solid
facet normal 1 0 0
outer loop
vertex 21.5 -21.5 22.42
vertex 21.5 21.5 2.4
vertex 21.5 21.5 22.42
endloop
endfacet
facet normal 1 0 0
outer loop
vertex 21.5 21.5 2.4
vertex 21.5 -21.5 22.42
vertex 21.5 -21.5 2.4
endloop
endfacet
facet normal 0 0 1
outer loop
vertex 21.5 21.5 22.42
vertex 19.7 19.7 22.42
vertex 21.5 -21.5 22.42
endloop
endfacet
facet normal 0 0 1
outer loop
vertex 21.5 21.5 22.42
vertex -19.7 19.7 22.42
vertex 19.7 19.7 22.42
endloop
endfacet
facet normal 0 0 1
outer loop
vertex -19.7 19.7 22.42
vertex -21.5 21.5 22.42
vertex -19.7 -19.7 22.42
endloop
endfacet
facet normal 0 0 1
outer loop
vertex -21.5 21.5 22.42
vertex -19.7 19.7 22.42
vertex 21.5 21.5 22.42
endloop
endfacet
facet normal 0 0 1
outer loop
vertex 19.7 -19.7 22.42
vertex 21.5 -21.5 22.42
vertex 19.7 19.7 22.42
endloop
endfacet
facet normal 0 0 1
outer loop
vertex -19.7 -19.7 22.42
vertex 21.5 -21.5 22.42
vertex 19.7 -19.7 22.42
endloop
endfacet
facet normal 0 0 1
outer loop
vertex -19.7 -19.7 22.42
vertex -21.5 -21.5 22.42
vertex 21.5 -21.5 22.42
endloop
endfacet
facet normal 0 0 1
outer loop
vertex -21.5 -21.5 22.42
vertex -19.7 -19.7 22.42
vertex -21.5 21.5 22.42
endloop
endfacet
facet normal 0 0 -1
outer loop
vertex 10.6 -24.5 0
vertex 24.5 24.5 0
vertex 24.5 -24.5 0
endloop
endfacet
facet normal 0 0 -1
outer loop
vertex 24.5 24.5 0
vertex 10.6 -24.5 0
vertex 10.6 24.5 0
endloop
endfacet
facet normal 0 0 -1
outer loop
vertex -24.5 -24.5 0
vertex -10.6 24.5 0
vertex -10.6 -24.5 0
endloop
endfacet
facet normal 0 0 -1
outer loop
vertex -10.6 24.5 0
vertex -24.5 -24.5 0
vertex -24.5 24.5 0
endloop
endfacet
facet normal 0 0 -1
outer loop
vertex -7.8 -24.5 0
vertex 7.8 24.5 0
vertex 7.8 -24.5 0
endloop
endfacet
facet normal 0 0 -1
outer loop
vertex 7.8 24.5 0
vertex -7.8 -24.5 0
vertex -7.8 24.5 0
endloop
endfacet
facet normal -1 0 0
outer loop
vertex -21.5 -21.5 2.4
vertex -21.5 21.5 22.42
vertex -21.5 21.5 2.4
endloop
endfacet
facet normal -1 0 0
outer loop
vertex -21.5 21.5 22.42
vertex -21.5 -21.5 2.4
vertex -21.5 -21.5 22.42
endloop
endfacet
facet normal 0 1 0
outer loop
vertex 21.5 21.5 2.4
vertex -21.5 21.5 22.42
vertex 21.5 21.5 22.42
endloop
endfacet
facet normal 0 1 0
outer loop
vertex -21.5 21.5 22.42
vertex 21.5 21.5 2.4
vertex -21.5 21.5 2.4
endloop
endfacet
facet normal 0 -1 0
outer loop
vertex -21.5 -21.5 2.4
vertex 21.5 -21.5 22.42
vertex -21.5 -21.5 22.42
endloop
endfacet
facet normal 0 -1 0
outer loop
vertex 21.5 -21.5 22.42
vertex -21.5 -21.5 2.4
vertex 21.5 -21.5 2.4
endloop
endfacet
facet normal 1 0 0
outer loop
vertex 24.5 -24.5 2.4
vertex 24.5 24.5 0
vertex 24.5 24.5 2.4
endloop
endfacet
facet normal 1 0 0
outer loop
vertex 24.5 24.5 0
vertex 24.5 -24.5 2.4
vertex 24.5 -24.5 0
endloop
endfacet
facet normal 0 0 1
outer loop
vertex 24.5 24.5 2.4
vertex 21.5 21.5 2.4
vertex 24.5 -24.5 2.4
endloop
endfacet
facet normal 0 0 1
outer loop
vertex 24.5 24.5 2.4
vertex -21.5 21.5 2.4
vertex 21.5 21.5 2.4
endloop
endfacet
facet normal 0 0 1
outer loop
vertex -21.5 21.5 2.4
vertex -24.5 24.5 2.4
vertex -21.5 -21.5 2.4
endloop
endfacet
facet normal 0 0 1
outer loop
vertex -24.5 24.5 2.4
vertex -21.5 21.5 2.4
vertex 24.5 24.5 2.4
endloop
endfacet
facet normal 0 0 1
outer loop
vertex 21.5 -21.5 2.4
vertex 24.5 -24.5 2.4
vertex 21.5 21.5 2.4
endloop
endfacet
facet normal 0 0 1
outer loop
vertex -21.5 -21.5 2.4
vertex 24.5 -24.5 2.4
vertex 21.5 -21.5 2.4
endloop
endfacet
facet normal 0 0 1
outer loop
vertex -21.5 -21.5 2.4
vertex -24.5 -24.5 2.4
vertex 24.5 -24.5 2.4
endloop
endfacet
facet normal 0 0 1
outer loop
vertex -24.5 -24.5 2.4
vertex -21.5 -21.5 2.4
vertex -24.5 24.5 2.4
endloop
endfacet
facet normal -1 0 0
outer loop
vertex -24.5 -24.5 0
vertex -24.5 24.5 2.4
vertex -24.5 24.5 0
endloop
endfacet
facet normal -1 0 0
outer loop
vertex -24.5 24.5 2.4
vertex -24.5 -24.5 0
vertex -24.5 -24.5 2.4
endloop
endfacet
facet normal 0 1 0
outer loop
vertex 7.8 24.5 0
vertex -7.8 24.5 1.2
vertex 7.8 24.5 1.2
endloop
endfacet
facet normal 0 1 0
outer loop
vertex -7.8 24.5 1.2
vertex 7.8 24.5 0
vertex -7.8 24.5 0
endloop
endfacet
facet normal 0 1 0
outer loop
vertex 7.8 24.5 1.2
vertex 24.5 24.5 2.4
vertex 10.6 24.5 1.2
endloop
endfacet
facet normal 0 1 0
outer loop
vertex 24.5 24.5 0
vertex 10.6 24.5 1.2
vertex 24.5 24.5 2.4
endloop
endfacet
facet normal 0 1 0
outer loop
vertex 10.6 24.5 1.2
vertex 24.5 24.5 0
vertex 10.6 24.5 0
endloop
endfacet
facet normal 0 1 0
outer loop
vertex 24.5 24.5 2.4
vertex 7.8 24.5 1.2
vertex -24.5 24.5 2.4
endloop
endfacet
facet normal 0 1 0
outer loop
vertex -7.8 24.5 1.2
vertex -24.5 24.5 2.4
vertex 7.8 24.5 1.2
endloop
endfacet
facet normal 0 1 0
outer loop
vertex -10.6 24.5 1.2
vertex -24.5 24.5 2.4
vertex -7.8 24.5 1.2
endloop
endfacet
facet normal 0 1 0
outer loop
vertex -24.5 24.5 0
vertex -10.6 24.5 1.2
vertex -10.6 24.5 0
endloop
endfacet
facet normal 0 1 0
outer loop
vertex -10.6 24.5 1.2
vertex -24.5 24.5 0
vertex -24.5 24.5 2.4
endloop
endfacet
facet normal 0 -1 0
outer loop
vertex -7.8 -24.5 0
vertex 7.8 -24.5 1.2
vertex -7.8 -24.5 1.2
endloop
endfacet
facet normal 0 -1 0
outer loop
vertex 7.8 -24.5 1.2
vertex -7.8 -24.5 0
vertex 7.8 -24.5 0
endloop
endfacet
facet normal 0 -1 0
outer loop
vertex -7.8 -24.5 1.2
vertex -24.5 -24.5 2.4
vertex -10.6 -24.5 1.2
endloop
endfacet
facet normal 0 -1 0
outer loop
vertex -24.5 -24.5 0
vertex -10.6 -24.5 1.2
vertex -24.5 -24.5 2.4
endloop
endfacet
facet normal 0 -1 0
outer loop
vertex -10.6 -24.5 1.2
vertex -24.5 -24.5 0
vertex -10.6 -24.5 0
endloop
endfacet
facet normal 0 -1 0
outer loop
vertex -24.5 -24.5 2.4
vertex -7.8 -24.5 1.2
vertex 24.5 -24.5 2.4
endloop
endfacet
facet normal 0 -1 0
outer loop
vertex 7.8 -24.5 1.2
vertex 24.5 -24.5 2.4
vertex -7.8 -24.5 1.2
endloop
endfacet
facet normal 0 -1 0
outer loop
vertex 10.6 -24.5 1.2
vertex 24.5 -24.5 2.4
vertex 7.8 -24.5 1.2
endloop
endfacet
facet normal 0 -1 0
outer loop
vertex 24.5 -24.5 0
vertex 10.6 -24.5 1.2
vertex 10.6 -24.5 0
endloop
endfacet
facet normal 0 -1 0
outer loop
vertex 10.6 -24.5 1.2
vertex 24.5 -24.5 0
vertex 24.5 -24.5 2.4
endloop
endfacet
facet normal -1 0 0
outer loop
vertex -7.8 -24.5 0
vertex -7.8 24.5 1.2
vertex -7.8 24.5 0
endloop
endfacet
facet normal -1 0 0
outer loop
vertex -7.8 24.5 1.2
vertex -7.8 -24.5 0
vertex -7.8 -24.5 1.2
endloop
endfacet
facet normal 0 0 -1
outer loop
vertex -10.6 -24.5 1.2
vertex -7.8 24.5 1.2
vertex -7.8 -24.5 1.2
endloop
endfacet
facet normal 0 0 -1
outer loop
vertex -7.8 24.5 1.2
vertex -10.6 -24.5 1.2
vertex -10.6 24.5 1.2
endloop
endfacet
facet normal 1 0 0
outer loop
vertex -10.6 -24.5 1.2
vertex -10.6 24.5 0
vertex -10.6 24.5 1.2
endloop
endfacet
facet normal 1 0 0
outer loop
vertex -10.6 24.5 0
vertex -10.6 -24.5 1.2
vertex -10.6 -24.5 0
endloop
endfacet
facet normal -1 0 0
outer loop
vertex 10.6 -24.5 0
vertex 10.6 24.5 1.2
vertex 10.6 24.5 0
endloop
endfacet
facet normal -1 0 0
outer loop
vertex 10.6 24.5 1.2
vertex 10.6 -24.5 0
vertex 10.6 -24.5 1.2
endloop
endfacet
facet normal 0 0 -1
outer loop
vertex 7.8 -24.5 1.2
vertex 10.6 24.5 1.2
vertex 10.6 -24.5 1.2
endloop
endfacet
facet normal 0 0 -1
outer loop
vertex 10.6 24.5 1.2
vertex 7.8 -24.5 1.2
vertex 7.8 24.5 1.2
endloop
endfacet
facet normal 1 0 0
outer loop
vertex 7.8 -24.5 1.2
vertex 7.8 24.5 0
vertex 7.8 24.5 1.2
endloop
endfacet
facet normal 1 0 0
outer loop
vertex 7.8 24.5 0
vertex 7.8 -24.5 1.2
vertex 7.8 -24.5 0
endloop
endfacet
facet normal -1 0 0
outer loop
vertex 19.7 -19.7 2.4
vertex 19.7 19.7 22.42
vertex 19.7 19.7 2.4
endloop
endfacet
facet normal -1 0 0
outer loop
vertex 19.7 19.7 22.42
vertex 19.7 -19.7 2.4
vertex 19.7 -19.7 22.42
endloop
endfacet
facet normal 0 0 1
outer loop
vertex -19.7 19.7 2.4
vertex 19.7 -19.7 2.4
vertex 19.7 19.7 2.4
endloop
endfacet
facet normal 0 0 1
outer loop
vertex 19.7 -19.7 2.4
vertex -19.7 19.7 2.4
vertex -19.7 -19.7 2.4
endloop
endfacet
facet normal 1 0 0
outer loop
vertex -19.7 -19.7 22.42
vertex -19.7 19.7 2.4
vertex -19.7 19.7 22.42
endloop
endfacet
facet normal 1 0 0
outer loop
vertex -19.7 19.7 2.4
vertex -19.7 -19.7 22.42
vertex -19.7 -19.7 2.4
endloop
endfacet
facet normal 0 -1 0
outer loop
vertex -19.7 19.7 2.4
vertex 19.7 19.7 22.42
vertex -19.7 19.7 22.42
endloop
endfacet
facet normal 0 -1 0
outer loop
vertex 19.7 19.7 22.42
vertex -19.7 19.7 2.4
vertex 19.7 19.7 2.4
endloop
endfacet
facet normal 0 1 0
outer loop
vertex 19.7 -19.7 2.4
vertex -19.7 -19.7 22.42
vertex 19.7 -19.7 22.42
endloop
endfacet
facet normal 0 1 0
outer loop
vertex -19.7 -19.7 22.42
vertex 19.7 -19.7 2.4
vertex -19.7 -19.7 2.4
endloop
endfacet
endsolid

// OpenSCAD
// -*- mode: SCAD ; c-file-style: "ellemtel" ; coding: utf-8 -*-
//
// A simple "coaster" to stop condiment bottles from falling over when
// placed on the bars of a the grid in the fridge
//
// Copyright 2018 Roland Sieker <ospalh@gmail.com>
// Licence: CC-BY-SA 4.0


// Distance from one bar of the fridge shelf grid to the next. All sizes are in millimetres.
bar_spacing = 18.4;  // [5:0.1:30]
// Diameter of one shelf grid bar
bar_width = 2.8;  // [0.5:0.1:7]
// Height of the coaster pot.
pot_height = 20;  // [3:0.5:50]

// Breadth (x direction size) of the bottle to hold
x_width = 39;  // [10:0.1:80]

// Depth (y direction size) of the bottle to hold
y_width = 39;  // [10:0.1:80]

// Width of the flange. How much the bottom is wider than the pot on top.
flange = 3;  // [0:0.5:15]


/* [Hidden] */

// Done with the customizer

preview = 0; // [0:render, 1:preview]
// Kept, but not used


// *******************************************************
// Extra parameters. These can be changed reasonably safely.


w = 1.8;  // Wall width
p = 1.2;  // Bottom, top plate height
c = 0.4;  // Clearance
angle = 60; // Overhangs much below 60 degrees are a problem for me

// *******************************************************
// Some shortcuts. These shouldn't be changed

tau = 2 * PI;  // pi is still wrong

xy_factor = 1/tan(angle);
// To get from a height to a horizontal width inclined correctly
z_factor = tan(angle);  // The other way around


xw = x_width + c;
yw = y_width + c;
xww = xw + 2*w;
yww = yw + 2*w;

some_distance = 50;
ms = 0.01;  // Muggeseggele.

// fn for differently sized objects and fs, fa; all for preview or rendering.
pna = 40;
pnb = 15;
pa = 5;
ps = 1;
rna = 180;
rnb = 30;
ra = 1;
rs = 0.1;
function na() = (preview) ? pna : rna;
function nb() = (preview) ? pnb : rnb;
$fs = (preview) ? ps : rs;
$fa = (preview) ? pa : ra;

// *******************************************************
// End setup



// *******************************************************
// Generate the parts

fridge_coaster();

// *******************************************************
// Code for the parts themselves


module fridge_coaster()
{

   hrc = ceil((xw+w+bar_width+flange)/bar_spacing) + 1;
   difference()
   {
      union()
      {
         translate([0,0,p+pot_height/2+ms])
         {
            cube([xww, yww, 2*p+pot_height+2*ms], center=true);
         }
         translate([0,0,p])
         {
            cube([xww+2*flange, yww+2*flange, 2*p], center=true);
         }
      }
      translate([0,0,2*p])
      {
         translate([0,0,p+pot_height/2+ms])
         {
            cube([xw, yw, 2*p+pot_height+2*ms], center=true);
         }
      }
      for (o=[-hrc:hrc])
      {
         echo(o);
         translate([(o+0.5)*bar_spacing,0, 0])
         {
            cube([bar_width, yww + 2*(c+bar_width+flange+ms), 2*p], center=true);
         }
      }
   }
}
